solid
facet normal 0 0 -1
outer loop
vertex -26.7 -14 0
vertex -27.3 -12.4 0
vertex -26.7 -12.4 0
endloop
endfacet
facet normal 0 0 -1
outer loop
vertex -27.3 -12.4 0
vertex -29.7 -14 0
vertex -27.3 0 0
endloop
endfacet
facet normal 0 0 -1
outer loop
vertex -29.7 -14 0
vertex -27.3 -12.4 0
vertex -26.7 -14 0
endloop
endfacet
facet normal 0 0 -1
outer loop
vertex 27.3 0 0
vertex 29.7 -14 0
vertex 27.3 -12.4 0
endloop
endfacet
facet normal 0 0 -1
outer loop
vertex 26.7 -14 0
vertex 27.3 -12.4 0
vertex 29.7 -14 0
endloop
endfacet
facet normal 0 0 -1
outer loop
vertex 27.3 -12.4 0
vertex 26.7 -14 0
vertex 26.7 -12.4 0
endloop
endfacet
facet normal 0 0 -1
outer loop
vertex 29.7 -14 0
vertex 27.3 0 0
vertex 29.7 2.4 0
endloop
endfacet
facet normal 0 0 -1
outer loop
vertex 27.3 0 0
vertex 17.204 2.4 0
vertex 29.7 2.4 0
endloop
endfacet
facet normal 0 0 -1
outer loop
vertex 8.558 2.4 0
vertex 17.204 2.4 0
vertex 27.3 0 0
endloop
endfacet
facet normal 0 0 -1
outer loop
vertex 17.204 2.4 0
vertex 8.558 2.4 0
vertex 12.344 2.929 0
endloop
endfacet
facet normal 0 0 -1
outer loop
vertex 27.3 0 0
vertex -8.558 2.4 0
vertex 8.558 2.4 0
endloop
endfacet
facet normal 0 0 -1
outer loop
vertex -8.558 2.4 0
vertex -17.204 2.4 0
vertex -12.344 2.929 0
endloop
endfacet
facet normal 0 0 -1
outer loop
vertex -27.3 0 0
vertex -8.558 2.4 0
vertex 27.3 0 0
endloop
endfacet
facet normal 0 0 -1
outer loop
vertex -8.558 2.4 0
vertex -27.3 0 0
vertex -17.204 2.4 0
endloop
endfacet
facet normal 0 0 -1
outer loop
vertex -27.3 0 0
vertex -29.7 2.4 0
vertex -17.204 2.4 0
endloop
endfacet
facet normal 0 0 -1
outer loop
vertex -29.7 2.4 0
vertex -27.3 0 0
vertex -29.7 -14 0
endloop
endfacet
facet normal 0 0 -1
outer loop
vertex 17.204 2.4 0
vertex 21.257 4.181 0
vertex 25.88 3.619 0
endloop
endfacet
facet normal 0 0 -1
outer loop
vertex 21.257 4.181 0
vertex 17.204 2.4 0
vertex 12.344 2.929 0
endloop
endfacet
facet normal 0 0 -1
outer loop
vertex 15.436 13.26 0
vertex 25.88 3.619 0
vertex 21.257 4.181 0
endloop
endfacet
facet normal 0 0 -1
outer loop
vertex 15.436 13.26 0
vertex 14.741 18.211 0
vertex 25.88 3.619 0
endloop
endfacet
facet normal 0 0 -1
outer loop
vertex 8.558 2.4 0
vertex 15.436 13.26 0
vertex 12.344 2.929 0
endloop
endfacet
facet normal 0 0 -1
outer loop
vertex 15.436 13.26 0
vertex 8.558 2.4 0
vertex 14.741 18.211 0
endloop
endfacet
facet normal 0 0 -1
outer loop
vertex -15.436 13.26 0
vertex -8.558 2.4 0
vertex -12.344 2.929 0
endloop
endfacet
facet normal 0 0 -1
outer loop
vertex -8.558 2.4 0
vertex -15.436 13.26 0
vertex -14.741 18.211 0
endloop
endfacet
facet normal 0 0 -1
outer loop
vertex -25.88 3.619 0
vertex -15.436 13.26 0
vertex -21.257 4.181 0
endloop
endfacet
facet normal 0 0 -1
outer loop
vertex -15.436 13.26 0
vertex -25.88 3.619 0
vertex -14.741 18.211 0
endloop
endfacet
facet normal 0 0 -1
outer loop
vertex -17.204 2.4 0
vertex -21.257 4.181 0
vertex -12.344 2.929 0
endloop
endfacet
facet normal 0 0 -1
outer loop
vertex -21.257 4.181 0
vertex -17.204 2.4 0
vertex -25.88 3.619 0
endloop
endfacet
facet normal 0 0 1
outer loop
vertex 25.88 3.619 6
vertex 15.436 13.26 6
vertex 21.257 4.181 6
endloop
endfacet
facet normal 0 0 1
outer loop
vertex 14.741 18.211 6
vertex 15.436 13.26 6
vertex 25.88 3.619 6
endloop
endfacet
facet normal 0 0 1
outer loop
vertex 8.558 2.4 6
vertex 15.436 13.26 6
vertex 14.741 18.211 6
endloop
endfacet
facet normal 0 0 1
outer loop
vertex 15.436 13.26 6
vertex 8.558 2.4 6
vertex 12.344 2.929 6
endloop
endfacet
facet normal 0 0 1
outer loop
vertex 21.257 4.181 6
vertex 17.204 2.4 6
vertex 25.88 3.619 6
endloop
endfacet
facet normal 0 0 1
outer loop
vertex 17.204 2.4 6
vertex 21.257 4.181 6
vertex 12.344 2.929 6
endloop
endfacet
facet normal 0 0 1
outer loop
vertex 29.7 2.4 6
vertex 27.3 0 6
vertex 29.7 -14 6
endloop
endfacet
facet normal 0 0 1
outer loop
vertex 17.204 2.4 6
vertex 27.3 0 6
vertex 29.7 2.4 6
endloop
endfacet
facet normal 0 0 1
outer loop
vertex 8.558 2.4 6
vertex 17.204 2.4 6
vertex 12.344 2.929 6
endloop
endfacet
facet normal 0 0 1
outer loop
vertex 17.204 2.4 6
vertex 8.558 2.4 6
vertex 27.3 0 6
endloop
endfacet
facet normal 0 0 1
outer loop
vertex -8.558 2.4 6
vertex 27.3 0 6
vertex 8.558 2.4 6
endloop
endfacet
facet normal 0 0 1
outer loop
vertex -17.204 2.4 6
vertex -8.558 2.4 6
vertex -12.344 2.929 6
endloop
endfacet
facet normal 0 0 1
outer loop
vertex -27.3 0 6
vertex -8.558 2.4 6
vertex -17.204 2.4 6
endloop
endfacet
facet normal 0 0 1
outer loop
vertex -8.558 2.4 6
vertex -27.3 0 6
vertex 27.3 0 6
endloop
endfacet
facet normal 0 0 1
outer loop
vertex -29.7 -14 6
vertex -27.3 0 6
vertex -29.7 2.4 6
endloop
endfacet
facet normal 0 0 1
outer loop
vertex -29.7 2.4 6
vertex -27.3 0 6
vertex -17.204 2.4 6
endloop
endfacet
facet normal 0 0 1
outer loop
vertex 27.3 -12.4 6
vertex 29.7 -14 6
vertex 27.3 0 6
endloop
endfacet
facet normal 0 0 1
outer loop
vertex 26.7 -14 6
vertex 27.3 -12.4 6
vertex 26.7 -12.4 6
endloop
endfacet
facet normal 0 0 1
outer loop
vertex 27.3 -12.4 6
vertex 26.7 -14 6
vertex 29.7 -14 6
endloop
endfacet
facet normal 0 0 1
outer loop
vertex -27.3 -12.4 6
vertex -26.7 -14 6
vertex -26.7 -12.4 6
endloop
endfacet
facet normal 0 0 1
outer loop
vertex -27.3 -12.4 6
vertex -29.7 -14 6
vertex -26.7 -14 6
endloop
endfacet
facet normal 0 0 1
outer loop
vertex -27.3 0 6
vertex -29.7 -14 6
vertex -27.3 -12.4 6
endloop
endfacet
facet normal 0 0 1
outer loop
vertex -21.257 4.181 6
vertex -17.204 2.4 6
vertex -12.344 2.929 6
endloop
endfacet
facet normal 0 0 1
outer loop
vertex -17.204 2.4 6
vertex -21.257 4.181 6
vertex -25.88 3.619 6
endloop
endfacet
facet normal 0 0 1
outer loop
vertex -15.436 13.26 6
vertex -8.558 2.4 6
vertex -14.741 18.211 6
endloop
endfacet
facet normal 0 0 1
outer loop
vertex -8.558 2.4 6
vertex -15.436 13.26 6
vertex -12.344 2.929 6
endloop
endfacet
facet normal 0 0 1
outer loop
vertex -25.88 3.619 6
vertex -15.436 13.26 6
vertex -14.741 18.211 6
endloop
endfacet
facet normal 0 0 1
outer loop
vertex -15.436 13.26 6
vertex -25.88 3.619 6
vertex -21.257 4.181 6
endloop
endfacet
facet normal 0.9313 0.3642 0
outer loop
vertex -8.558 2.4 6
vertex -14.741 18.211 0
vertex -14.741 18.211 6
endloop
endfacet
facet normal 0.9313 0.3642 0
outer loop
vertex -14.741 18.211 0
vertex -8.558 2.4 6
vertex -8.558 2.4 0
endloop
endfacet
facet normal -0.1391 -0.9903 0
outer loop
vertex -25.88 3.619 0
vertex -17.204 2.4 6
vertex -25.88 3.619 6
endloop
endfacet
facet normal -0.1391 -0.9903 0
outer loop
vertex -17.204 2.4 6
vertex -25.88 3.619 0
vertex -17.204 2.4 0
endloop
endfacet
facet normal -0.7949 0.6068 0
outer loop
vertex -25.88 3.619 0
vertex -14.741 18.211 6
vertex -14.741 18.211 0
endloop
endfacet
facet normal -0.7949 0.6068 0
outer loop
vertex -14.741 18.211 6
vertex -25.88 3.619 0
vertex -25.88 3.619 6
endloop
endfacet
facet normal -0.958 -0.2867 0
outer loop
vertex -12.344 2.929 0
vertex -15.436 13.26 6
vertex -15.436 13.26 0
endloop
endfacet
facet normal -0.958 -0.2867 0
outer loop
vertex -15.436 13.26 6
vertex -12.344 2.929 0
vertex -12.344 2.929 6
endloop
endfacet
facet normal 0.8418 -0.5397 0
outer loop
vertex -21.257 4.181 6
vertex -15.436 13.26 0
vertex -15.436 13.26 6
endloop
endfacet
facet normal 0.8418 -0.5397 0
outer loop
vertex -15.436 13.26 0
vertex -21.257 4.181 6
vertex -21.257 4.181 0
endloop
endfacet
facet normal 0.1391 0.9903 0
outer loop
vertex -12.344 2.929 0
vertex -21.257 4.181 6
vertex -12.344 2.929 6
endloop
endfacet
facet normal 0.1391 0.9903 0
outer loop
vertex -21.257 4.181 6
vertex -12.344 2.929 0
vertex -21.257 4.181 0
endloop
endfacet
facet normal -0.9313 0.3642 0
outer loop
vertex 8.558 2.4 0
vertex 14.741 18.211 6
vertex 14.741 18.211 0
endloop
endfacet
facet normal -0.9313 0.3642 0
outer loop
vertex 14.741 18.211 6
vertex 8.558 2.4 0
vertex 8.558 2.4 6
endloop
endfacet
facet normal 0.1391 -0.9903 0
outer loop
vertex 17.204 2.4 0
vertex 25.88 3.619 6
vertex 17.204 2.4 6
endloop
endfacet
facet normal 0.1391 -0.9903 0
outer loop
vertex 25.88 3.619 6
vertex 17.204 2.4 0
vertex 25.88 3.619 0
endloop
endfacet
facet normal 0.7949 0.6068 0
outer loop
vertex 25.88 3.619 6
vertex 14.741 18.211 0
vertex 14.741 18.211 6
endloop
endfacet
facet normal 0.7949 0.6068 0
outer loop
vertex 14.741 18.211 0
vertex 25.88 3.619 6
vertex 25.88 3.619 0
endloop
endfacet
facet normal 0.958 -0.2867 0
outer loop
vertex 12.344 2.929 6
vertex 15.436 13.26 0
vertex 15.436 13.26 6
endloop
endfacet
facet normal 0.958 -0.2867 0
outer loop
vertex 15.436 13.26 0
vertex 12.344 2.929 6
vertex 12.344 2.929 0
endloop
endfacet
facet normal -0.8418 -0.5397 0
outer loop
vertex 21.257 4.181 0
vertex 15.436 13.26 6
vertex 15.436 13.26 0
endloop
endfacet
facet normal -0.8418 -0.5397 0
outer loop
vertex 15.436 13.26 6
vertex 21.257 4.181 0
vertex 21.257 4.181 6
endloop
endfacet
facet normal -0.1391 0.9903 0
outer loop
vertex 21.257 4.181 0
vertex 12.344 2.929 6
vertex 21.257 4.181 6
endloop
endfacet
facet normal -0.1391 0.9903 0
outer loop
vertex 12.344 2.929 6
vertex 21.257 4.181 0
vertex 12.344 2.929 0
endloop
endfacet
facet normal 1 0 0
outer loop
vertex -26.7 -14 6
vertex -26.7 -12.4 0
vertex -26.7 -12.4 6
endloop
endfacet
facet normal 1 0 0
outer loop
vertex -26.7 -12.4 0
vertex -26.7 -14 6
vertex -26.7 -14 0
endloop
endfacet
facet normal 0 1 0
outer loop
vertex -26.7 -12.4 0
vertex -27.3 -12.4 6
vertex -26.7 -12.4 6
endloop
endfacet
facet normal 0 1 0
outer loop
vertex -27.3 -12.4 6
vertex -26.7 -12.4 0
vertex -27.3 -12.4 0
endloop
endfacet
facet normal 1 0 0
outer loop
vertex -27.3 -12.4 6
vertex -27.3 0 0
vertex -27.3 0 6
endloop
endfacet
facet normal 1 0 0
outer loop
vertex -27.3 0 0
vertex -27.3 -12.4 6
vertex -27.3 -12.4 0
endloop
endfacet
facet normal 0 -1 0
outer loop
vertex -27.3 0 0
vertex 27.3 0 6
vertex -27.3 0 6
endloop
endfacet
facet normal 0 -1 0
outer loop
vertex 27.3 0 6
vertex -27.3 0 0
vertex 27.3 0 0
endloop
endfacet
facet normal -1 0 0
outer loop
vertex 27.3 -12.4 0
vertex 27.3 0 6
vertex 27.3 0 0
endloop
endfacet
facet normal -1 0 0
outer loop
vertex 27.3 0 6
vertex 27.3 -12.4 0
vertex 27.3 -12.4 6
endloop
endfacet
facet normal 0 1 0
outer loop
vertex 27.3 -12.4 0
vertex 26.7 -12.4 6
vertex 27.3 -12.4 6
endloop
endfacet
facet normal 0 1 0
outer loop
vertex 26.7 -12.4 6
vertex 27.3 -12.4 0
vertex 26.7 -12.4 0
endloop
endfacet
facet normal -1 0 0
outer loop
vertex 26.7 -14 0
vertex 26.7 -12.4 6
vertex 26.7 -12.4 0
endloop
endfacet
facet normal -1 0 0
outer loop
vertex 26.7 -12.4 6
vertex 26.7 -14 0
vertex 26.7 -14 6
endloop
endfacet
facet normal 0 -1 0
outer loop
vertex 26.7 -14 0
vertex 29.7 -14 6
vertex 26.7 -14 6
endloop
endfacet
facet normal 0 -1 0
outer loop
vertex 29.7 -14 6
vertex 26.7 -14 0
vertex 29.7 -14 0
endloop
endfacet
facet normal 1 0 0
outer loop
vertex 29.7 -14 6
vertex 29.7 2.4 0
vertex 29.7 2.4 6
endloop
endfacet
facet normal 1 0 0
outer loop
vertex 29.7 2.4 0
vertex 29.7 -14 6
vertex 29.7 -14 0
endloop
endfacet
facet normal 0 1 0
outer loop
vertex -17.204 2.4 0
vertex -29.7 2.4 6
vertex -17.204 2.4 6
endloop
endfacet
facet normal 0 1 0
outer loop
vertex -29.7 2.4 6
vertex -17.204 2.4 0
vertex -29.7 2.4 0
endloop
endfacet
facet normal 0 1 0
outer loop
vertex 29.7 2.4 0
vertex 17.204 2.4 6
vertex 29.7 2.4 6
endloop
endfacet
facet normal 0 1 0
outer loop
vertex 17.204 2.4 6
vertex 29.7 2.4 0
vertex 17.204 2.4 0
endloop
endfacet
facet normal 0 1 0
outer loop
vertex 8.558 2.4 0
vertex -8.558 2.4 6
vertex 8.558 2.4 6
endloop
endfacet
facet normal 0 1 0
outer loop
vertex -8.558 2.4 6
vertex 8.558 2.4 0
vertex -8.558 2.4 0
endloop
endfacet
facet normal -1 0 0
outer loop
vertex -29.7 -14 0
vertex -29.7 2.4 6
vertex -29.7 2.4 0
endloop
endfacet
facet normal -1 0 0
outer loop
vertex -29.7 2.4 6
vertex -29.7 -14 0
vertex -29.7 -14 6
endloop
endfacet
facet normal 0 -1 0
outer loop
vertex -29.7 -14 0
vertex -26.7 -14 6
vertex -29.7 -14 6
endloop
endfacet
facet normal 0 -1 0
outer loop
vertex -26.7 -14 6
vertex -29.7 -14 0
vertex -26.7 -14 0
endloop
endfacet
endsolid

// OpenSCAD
// accessories/ear_band.scad (7/23)
// Snap-on headband accessories for the K151 head unit (MainBody 54.0 wide,
// measured from cad/vendor/k151/StackChan-MainBody.stl). Prints LYING FLAT.
//   PART = "cat"    : cat ears
//   PART = "bunny"  : tall bunny ears
//   PART = "ribbon" : ribbon / bow
// The U-band clips over the top of the head; small lips snap on the sides.

head_w  = 54.0;
fit     = 0.6;          // opening play
band_t  = 2.4;          // band thickness (in plane)
band_w  = 6;            // band width (print height, lies flat)
arm_len = 14;           // side arm length
lip     = 0.6;          // snap lip at the arm tips

iw = head_w + fit;      // 54.6 inner span

module band() {
    // top bar + two side arms with inward lips (2D in X-Z, extruded in Y)
    linear_extrude(band_w) {
        // top bar
        translate([-iw/2 - band_t, 0]) square([iw + 2 * band_t, band_t]);
        for (sx = [-1, 1]) scale([sx, 1]) {
            // arm
            translate([iw/2, -arm_len]) square([band_t, arm_len]);
            // snap lip
            translate([iw/2 - lip, -arm_len]) square([band_t/2 + lip, 1.6]);
        }
    }
}

module cat_ear() {
    // triangle with a small inner-ear notch
    difference() {
        polygon([[-9, 0], [9, 0], [0, 16]]);
        polygon([[-4.5, 1.2], [4.5, 1.2], [0, 11]]);
    }
}

module cat()   { band();
    for (sx = [-1, 1]) scale([sx, 1, 1])
        translate([iw/2 - 10, 0, 0]) rotate([0, 0, 8])
            translate([0, band_t - 0.01, 0]) linear_extrude(band_w) cat_ear();
}

module bunny_ear() {
    hull() {
        translate([0, 24]) scale([1, 1.6]) circle(d = 11, $fn = 40);
        translate([0, 2]) circle(d = 9, $fn = 40);
    }
}

module bunny() { band();
    for (sx = [-1, 1]) scale([sx, 1, 1])
        translate([iw/2 - 12, band_t - 0.01, 0]) rotate([0, 0, -6])
            linear_extrude(band_w) bunny_ear();
}

module ribbon() { band();
    translate([0, band_t - 0.01, 0]) linear_extrude(band_w) {
        // two bow wings + centre knot
        for (sx = [-1, 1]) scale([sx, 1])
            polygon([[3, 1], [20, 12], [20, 0.5], [3, -1.5]]);
        translate([-4, -2]) square([8, 15]);
    }
}

PART = "cat";
if (PART == "bunny")       bunny();
else if (PART == "ribbon") ribbon();
else                       cat();
